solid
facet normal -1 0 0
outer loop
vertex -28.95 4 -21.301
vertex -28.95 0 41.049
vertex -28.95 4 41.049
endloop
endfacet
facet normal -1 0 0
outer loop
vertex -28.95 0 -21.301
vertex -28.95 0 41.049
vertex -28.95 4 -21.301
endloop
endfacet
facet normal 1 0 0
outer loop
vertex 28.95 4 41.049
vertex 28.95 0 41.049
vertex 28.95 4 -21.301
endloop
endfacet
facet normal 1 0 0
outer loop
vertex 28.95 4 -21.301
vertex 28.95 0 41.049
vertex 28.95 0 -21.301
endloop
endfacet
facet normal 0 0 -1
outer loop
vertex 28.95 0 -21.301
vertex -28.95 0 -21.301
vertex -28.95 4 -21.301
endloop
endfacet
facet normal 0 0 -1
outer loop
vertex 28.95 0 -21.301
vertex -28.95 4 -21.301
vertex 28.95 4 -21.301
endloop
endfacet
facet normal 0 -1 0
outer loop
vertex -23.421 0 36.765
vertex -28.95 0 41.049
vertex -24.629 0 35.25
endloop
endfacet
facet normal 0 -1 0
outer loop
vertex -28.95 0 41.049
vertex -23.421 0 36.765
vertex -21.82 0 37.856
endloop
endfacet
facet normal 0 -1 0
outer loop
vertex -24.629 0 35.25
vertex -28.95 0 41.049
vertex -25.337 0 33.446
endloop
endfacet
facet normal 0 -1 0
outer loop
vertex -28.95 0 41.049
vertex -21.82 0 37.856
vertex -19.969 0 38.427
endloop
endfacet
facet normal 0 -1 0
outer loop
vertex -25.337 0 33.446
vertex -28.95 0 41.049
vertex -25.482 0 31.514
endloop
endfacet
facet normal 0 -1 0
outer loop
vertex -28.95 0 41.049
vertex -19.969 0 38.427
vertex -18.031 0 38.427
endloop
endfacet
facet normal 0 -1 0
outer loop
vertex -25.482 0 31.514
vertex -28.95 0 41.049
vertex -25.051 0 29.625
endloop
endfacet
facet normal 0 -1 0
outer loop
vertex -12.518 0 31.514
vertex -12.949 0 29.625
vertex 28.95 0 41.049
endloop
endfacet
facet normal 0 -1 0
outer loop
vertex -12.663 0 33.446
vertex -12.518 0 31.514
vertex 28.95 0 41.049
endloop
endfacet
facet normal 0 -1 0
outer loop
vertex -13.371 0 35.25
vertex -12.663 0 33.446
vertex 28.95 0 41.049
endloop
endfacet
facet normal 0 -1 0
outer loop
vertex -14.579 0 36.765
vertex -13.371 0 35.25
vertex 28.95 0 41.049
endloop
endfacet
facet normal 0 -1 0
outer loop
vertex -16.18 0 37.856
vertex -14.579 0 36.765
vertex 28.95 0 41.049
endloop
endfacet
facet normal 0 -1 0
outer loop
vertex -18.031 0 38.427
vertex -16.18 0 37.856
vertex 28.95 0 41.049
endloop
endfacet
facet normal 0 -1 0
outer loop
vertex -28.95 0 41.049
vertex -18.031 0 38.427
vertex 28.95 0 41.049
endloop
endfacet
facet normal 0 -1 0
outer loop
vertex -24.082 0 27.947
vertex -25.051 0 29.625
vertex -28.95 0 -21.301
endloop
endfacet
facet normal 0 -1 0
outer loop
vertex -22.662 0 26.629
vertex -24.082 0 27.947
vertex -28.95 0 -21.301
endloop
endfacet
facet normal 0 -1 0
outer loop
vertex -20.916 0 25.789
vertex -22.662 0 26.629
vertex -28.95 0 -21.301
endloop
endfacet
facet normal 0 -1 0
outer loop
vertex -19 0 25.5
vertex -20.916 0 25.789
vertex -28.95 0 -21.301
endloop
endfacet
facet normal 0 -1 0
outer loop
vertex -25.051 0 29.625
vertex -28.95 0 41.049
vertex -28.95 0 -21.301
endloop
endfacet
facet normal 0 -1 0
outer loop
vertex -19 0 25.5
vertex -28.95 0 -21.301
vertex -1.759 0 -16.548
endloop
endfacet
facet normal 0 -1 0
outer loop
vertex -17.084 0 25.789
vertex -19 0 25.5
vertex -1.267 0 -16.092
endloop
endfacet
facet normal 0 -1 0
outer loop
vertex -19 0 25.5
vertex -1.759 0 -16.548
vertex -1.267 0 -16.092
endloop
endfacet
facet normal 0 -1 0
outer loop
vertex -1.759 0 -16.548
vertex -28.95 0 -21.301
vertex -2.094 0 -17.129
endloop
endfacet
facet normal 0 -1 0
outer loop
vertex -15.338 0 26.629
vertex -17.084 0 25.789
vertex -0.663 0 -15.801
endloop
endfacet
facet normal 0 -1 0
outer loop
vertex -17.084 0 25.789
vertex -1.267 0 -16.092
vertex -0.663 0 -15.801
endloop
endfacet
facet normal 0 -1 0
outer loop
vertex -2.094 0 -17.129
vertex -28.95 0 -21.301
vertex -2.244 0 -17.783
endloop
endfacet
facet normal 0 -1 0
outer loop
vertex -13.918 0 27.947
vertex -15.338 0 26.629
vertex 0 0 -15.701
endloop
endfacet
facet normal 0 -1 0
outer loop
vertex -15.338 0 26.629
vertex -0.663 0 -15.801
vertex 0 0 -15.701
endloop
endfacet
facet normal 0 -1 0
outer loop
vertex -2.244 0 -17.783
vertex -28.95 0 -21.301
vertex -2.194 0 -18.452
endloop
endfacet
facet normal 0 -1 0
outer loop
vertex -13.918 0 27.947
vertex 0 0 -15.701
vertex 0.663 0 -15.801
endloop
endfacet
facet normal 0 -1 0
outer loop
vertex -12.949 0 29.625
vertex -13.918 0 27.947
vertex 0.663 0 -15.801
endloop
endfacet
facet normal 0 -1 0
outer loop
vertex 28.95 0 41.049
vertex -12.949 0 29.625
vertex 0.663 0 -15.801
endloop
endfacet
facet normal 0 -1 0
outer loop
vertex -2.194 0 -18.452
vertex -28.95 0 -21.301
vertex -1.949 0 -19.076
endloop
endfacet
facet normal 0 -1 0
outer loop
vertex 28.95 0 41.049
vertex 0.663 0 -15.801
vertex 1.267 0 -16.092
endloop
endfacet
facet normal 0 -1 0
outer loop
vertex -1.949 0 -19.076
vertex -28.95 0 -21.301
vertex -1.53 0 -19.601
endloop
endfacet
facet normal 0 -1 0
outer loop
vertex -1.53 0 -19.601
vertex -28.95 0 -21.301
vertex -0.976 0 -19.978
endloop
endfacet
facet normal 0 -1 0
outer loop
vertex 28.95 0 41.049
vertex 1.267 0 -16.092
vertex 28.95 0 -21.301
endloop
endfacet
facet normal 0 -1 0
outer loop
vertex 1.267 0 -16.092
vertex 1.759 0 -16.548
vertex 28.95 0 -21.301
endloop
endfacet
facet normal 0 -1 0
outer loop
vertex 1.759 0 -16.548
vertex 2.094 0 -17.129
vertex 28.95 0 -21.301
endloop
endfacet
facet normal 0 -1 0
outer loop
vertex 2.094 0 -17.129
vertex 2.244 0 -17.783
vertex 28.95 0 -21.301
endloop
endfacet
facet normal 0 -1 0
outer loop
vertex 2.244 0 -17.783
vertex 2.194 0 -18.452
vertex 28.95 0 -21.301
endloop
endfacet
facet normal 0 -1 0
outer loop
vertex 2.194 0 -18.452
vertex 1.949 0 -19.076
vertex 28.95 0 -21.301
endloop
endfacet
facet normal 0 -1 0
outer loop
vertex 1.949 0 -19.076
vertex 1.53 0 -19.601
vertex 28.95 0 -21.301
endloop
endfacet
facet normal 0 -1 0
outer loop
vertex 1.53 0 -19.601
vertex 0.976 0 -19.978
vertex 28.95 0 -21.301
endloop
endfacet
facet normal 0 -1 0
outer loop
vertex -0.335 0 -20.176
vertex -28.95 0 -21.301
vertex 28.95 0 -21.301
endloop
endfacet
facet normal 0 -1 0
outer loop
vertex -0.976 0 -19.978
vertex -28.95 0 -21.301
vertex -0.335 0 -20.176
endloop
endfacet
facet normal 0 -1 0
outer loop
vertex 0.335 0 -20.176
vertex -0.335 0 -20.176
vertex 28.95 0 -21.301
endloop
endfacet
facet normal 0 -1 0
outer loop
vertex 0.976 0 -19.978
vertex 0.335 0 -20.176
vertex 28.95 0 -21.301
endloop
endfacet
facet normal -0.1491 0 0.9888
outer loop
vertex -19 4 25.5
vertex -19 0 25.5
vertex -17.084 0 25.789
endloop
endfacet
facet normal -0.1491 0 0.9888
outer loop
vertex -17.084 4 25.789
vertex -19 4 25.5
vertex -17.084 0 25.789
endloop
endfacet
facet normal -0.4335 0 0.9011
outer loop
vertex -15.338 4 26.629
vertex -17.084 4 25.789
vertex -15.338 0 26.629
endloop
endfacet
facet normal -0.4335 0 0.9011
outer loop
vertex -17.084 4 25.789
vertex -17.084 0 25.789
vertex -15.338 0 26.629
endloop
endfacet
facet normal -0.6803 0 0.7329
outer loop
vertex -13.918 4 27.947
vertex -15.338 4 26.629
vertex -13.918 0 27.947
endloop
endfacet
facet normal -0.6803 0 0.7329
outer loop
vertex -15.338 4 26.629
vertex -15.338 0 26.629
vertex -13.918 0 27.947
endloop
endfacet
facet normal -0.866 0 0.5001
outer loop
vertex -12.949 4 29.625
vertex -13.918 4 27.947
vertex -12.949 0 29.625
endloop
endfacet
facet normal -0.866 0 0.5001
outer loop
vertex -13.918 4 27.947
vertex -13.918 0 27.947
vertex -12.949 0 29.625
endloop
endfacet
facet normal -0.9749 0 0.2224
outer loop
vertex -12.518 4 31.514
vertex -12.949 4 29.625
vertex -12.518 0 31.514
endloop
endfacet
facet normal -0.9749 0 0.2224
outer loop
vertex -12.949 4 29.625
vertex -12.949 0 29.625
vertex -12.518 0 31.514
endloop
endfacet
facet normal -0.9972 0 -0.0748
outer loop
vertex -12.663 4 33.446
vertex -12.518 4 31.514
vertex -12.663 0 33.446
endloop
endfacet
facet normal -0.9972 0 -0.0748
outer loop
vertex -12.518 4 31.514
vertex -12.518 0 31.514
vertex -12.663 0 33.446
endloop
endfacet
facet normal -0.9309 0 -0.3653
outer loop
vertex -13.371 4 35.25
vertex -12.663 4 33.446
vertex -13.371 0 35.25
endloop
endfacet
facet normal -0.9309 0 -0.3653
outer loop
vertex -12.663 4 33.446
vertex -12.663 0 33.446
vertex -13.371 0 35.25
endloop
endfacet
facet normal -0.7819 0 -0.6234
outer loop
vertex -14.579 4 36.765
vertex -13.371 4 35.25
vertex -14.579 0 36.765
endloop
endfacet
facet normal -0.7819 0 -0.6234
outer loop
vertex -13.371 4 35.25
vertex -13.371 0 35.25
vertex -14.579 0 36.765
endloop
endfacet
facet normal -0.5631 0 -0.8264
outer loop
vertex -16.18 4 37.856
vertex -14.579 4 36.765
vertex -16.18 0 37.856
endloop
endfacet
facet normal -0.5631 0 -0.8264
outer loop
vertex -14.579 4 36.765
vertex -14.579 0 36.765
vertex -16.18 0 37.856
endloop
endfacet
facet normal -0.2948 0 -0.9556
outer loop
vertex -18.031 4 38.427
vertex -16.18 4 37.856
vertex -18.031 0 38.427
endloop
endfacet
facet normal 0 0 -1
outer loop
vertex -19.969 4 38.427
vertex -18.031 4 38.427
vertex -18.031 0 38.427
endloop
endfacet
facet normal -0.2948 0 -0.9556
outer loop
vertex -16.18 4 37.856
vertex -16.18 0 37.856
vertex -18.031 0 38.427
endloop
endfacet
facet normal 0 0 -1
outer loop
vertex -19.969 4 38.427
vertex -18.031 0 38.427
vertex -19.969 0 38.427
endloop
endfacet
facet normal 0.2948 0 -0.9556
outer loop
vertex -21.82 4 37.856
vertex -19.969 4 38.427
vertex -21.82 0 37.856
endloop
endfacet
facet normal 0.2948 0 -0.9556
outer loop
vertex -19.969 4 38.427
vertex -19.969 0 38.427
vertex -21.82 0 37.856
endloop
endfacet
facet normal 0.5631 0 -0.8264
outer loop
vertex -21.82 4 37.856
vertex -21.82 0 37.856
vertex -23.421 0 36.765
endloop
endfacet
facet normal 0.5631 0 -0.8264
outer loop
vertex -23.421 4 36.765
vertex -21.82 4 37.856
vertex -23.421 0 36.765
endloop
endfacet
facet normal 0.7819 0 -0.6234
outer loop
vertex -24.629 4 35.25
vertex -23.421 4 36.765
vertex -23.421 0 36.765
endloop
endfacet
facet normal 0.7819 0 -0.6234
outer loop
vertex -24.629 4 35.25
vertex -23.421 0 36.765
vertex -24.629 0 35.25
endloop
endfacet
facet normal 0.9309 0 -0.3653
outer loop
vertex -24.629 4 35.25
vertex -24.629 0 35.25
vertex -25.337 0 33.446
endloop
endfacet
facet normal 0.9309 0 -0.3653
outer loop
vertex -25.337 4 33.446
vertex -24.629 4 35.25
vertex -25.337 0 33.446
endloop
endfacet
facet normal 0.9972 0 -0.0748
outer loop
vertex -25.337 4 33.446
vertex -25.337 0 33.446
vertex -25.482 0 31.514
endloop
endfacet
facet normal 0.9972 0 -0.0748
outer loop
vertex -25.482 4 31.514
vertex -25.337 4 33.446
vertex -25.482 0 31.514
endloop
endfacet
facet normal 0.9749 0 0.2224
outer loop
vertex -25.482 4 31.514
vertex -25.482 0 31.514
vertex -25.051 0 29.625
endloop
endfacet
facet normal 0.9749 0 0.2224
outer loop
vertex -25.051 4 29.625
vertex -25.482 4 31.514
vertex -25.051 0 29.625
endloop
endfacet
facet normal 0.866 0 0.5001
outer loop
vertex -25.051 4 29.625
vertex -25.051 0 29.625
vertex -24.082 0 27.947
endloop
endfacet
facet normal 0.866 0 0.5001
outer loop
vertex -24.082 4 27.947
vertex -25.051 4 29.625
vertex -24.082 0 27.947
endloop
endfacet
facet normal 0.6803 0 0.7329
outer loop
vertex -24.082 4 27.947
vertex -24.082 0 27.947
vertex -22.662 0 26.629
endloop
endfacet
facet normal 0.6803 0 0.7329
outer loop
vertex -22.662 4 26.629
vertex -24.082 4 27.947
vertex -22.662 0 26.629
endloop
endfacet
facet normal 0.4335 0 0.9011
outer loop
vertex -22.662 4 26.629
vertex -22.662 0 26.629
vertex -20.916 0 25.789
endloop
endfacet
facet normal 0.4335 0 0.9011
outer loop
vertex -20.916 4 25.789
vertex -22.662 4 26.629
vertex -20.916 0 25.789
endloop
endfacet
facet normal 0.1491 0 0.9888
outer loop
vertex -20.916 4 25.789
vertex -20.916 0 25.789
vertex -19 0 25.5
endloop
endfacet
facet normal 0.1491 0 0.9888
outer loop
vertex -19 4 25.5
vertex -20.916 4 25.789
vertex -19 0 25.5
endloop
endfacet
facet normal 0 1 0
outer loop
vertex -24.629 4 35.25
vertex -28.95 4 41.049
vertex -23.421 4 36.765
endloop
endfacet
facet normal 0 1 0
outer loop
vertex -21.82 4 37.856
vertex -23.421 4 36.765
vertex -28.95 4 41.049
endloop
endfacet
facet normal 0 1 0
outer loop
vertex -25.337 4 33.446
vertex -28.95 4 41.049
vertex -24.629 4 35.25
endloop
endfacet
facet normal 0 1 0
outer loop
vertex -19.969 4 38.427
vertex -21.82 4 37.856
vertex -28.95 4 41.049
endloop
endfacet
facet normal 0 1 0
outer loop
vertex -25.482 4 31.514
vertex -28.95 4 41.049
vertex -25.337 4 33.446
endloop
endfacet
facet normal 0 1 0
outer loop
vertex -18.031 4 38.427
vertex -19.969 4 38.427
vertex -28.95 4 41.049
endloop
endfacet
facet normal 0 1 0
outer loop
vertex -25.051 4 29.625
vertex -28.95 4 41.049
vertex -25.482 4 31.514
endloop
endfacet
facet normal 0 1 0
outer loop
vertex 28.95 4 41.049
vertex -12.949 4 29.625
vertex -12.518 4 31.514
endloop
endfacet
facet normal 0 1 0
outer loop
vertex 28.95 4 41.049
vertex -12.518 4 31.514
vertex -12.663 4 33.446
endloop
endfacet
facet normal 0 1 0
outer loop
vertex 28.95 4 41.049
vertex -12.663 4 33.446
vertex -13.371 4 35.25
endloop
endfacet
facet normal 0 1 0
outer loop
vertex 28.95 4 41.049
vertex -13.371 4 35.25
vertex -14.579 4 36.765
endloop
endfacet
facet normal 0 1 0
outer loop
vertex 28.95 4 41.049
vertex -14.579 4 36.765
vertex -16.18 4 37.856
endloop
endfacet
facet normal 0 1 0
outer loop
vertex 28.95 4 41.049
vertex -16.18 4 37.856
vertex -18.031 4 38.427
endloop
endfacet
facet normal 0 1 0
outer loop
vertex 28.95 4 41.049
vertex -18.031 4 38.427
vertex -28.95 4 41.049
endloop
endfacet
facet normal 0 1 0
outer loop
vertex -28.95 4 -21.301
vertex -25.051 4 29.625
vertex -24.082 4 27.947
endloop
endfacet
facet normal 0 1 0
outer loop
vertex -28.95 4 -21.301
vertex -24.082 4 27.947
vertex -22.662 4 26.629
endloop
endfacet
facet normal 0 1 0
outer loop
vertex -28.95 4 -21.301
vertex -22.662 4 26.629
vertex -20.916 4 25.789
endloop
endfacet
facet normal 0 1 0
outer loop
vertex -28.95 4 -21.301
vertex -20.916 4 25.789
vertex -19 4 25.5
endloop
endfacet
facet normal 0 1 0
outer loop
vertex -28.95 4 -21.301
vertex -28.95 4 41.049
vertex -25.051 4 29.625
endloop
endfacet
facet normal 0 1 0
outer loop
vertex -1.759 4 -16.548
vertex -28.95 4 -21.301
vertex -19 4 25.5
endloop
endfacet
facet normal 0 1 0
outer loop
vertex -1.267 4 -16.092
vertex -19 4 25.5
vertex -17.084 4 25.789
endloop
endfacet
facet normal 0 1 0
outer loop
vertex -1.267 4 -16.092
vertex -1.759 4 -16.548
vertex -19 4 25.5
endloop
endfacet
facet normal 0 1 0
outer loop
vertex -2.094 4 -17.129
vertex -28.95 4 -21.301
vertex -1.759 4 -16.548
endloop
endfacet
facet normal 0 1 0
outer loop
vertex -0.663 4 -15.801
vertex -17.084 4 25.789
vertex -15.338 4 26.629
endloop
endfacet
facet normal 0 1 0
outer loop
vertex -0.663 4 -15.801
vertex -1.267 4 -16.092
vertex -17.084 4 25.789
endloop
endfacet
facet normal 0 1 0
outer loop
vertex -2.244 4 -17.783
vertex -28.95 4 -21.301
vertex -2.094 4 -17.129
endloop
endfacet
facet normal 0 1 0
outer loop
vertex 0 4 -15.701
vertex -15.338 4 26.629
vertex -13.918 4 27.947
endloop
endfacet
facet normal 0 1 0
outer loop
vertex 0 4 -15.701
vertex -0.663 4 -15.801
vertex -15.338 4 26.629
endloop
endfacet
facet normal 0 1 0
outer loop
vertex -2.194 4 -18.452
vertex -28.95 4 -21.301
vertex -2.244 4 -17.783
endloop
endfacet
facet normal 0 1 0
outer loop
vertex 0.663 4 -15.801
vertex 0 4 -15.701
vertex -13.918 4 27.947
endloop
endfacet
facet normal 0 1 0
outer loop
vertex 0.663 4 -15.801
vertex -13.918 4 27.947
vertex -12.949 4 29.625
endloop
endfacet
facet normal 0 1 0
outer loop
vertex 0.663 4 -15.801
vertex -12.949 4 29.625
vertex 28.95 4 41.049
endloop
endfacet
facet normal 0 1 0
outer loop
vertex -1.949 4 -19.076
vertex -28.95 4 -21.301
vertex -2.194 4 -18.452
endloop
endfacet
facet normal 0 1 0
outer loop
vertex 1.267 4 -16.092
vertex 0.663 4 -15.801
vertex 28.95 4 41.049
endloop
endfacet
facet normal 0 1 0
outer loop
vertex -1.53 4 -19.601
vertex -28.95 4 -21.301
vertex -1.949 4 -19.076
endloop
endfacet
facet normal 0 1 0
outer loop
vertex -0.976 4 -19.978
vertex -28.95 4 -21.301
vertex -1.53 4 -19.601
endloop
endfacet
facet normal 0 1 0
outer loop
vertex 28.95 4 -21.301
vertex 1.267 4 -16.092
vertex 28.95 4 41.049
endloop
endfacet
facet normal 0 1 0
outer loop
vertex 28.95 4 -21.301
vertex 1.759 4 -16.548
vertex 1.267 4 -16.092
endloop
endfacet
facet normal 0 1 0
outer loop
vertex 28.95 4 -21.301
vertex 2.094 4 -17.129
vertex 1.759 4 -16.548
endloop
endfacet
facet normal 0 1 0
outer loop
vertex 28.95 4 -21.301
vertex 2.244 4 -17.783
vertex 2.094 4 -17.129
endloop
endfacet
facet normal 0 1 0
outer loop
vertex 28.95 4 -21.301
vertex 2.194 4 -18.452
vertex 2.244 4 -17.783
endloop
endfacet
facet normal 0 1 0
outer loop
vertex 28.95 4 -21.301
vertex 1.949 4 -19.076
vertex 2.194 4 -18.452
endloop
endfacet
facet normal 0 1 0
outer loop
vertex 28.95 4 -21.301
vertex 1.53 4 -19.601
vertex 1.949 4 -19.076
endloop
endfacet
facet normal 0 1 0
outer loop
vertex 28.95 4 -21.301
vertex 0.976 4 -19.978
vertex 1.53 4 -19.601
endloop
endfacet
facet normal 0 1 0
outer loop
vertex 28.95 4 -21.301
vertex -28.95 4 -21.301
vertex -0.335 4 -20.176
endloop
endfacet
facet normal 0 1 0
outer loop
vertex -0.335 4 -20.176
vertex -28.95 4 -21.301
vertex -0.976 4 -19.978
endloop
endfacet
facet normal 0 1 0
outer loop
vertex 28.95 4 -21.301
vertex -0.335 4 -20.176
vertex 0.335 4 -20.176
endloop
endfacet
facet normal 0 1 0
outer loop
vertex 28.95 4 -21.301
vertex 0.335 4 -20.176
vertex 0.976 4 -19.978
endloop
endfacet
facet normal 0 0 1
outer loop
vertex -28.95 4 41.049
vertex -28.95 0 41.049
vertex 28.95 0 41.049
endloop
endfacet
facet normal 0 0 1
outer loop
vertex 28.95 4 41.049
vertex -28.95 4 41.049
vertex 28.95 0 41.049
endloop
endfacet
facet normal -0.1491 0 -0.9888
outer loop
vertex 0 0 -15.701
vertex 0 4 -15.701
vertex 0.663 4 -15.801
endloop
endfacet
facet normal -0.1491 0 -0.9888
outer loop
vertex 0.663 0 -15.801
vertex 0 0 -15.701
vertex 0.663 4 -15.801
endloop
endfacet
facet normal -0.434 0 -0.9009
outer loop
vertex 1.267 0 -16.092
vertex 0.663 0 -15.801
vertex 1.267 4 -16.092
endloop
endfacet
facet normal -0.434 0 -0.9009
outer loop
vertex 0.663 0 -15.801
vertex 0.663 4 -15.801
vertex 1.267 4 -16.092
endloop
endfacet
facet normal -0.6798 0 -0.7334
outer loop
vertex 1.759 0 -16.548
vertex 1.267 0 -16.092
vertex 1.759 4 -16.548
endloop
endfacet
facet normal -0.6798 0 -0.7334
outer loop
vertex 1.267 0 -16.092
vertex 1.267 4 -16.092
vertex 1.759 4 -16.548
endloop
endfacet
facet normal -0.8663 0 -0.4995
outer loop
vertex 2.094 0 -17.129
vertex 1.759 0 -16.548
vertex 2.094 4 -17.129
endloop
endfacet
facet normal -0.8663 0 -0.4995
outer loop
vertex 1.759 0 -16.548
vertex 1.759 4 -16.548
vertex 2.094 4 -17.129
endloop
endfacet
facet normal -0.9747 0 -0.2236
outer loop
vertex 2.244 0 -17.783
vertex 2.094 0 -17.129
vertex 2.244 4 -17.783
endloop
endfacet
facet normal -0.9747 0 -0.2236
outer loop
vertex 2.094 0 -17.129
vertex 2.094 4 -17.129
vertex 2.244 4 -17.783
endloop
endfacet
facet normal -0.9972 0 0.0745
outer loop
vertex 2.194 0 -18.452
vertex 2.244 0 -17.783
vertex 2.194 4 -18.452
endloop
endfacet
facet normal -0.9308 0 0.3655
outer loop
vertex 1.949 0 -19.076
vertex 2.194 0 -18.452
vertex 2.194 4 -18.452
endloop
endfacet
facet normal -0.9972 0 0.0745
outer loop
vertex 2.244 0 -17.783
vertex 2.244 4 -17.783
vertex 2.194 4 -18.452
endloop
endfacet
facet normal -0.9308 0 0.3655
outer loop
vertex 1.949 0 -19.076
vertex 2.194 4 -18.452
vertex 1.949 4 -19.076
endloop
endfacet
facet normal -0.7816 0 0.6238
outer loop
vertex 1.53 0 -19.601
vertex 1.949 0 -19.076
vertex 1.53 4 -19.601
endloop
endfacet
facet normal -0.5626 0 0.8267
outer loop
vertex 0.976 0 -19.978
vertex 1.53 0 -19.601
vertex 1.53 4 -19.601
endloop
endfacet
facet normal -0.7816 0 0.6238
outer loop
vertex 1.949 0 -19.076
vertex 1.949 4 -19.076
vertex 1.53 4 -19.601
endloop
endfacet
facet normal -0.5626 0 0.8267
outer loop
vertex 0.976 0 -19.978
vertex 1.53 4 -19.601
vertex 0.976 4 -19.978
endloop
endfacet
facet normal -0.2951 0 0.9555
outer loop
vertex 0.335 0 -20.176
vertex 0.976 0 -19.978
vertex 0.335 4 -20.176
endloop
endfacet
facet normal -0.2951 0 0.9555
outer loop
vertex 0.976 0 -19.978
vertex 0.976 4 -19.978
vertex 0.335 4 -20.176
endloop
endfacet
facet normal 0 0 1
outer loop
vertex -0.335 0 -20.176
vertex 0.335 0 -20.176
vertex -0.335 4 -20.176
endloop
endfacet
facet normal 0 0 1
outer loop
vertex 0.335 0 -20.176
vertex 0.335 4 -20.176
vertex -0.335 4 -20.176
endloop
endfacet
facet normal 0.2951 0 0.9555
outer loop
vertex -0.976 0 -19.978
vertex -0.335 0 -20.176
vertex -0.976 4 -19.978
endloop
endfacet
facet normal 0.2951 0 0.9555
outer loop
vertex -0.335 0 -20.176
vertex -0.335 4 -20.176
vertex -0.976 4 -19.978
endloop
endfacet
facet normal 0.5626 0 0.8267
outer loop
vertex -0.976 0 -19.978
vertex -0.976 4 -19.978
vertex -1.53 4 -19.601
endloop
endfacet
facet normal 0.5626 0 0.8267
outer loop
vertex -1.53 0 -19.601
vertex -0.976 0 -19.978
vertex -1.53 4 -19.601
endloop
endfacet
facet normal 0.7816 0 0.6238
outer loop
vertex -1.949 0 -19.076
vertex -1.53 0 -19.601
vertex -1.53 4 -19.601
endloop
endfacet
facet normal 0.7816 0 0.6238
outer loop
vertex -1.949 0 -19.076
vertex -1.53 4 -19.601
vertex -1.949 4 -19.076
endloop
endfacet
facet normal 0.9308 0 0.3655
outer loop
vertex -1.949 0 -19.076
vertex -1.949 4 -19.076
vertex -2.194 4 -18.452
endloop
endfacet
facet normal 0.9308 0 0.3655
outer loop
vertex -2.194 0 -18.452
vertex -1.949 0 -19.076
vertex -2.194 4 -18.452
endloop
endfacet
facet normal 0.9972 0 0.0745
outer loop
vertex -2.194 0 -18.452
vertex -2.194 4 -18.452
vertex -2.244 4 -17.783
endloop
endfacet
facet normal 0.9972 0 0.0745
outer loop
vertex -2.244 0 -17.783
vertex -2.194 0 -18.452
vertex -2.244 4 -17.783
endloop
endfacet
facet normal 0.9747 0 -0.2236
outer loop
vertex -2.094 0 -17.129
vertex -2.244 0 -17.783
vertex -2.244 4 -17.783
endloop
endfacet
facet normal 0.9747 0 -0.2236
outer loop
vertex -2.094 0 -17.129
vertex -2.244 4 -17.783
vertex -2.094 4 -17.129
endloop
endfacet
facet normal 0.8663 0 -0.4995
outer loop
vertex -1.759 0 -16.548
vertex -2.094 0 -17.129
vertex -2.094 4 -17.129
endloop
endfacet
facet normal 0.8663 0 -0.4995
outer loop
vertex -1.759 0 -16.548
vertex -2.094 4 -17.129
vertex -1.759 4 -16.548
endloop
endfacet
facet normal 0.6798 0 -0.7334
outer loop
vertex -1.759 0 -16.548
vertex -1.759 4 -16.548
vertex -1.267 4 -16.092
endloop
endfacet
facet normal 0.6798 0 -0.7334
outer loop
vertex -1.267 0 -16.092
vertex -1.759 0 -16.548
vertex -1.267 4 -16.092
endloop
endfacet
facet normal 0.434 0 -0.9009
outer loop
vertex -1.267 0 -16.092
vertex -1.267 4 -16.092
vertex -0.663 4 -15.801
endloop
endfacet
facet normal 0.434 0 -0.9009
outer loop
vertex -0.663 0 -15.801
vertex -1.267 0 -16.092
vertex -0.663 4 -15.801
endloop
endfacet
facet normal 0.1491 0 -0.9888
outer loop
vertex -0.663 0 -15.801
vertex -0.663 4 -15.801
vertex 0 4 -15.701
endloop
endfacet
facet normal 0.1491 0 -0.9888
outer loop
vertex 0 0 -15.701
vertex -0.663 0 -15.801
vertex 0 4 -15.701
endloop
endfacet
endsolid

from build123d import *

# Parameters (mm, degrees)
ESQUISSE2_W             = 57.9
ESQUISSE2_H             = 62.35
BOSS_EXTRU_1_DEPTH      = 4
ESQUISSE3_R             = 6.5
ENL_V_MAT_EXTRU_1_DEPTH = 51.389483469
ESQUISSE4_R             = 2.25
ENL_V_MAT_EXTRU_2_DEPTH = 10


with BuildPart() as part:
    # Esquisse2 → Boss.-Extru.1 (new body)
    with BuildSketch(Plane(origin=(0, 0, 0), x_dir=(1, 0, 0), z_dir=(0, 1, 0))):
        with Locations((0, -9.873721591)):
            Rectangle(ESQUISSE2_W, ESQUISSE2_H)
    extrude(amount=BOSS_EXTRU_1_DEPTH)

    # Esquisse3 → Enlèv. mat.-Extru.1 (cut, through all)
    with BuildSketch(Plane.XZ):
        with Locations(Location((-19, 32, 0), (0, 0, 270))):
            Circle(ESQUISSE3_R)
    extrude(amount=-ENL_V_MAT_EXTRU_1_DEPTH, mode=Mode.SUBTRACT)

    # Esquisse4 → Enlèv. mat.-Extru.2 (cut)
    with BuildSketch(Plane(origin=(0, 4, 0), x_dir=(1, 0, 0), z_dir=(0, 1, 0))):
        with Locations(Location((0, 17.951278409, 0), (0, 0, 270))):
            Circle(ESQUISSE4_R)
    extrude(amount=-ENL_V_MAT_EXTRU_2_DEPTH, mode=Mode.SUBTRACT)


solid = part.part
